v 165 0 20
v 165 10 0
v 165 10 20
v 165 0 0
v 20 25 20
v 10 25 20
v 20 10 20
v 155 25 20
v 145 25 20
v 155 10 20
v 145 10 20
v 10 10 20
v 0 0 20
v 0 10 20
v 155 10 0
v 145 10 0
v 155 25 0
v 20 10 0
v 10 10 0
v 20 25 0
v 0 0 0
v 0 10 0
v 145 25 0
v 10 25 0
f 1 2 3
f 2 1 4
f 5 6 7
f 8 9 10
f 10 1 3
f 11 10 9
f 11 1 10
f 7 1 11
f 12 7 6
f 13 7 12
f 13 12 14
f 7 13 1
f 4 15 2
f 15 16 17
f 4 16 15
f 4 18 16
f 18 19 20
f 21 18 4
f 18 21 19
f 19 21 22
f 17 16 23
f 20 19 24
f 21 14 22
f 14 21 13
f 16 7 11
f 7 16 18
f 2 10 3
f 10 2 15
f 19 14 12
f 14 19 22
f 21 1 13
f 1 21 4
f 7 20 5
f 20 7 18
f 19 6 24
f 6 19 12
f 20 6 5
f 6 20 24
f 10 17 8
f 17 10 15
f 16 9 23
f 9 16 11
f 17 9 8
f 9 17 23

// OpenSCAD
cube([165, 10, 20]);
translate([10, 10, 0]) cube([10, 15, 20]);
translate([145, 10, 0]) cube([10, 15, 20]);
